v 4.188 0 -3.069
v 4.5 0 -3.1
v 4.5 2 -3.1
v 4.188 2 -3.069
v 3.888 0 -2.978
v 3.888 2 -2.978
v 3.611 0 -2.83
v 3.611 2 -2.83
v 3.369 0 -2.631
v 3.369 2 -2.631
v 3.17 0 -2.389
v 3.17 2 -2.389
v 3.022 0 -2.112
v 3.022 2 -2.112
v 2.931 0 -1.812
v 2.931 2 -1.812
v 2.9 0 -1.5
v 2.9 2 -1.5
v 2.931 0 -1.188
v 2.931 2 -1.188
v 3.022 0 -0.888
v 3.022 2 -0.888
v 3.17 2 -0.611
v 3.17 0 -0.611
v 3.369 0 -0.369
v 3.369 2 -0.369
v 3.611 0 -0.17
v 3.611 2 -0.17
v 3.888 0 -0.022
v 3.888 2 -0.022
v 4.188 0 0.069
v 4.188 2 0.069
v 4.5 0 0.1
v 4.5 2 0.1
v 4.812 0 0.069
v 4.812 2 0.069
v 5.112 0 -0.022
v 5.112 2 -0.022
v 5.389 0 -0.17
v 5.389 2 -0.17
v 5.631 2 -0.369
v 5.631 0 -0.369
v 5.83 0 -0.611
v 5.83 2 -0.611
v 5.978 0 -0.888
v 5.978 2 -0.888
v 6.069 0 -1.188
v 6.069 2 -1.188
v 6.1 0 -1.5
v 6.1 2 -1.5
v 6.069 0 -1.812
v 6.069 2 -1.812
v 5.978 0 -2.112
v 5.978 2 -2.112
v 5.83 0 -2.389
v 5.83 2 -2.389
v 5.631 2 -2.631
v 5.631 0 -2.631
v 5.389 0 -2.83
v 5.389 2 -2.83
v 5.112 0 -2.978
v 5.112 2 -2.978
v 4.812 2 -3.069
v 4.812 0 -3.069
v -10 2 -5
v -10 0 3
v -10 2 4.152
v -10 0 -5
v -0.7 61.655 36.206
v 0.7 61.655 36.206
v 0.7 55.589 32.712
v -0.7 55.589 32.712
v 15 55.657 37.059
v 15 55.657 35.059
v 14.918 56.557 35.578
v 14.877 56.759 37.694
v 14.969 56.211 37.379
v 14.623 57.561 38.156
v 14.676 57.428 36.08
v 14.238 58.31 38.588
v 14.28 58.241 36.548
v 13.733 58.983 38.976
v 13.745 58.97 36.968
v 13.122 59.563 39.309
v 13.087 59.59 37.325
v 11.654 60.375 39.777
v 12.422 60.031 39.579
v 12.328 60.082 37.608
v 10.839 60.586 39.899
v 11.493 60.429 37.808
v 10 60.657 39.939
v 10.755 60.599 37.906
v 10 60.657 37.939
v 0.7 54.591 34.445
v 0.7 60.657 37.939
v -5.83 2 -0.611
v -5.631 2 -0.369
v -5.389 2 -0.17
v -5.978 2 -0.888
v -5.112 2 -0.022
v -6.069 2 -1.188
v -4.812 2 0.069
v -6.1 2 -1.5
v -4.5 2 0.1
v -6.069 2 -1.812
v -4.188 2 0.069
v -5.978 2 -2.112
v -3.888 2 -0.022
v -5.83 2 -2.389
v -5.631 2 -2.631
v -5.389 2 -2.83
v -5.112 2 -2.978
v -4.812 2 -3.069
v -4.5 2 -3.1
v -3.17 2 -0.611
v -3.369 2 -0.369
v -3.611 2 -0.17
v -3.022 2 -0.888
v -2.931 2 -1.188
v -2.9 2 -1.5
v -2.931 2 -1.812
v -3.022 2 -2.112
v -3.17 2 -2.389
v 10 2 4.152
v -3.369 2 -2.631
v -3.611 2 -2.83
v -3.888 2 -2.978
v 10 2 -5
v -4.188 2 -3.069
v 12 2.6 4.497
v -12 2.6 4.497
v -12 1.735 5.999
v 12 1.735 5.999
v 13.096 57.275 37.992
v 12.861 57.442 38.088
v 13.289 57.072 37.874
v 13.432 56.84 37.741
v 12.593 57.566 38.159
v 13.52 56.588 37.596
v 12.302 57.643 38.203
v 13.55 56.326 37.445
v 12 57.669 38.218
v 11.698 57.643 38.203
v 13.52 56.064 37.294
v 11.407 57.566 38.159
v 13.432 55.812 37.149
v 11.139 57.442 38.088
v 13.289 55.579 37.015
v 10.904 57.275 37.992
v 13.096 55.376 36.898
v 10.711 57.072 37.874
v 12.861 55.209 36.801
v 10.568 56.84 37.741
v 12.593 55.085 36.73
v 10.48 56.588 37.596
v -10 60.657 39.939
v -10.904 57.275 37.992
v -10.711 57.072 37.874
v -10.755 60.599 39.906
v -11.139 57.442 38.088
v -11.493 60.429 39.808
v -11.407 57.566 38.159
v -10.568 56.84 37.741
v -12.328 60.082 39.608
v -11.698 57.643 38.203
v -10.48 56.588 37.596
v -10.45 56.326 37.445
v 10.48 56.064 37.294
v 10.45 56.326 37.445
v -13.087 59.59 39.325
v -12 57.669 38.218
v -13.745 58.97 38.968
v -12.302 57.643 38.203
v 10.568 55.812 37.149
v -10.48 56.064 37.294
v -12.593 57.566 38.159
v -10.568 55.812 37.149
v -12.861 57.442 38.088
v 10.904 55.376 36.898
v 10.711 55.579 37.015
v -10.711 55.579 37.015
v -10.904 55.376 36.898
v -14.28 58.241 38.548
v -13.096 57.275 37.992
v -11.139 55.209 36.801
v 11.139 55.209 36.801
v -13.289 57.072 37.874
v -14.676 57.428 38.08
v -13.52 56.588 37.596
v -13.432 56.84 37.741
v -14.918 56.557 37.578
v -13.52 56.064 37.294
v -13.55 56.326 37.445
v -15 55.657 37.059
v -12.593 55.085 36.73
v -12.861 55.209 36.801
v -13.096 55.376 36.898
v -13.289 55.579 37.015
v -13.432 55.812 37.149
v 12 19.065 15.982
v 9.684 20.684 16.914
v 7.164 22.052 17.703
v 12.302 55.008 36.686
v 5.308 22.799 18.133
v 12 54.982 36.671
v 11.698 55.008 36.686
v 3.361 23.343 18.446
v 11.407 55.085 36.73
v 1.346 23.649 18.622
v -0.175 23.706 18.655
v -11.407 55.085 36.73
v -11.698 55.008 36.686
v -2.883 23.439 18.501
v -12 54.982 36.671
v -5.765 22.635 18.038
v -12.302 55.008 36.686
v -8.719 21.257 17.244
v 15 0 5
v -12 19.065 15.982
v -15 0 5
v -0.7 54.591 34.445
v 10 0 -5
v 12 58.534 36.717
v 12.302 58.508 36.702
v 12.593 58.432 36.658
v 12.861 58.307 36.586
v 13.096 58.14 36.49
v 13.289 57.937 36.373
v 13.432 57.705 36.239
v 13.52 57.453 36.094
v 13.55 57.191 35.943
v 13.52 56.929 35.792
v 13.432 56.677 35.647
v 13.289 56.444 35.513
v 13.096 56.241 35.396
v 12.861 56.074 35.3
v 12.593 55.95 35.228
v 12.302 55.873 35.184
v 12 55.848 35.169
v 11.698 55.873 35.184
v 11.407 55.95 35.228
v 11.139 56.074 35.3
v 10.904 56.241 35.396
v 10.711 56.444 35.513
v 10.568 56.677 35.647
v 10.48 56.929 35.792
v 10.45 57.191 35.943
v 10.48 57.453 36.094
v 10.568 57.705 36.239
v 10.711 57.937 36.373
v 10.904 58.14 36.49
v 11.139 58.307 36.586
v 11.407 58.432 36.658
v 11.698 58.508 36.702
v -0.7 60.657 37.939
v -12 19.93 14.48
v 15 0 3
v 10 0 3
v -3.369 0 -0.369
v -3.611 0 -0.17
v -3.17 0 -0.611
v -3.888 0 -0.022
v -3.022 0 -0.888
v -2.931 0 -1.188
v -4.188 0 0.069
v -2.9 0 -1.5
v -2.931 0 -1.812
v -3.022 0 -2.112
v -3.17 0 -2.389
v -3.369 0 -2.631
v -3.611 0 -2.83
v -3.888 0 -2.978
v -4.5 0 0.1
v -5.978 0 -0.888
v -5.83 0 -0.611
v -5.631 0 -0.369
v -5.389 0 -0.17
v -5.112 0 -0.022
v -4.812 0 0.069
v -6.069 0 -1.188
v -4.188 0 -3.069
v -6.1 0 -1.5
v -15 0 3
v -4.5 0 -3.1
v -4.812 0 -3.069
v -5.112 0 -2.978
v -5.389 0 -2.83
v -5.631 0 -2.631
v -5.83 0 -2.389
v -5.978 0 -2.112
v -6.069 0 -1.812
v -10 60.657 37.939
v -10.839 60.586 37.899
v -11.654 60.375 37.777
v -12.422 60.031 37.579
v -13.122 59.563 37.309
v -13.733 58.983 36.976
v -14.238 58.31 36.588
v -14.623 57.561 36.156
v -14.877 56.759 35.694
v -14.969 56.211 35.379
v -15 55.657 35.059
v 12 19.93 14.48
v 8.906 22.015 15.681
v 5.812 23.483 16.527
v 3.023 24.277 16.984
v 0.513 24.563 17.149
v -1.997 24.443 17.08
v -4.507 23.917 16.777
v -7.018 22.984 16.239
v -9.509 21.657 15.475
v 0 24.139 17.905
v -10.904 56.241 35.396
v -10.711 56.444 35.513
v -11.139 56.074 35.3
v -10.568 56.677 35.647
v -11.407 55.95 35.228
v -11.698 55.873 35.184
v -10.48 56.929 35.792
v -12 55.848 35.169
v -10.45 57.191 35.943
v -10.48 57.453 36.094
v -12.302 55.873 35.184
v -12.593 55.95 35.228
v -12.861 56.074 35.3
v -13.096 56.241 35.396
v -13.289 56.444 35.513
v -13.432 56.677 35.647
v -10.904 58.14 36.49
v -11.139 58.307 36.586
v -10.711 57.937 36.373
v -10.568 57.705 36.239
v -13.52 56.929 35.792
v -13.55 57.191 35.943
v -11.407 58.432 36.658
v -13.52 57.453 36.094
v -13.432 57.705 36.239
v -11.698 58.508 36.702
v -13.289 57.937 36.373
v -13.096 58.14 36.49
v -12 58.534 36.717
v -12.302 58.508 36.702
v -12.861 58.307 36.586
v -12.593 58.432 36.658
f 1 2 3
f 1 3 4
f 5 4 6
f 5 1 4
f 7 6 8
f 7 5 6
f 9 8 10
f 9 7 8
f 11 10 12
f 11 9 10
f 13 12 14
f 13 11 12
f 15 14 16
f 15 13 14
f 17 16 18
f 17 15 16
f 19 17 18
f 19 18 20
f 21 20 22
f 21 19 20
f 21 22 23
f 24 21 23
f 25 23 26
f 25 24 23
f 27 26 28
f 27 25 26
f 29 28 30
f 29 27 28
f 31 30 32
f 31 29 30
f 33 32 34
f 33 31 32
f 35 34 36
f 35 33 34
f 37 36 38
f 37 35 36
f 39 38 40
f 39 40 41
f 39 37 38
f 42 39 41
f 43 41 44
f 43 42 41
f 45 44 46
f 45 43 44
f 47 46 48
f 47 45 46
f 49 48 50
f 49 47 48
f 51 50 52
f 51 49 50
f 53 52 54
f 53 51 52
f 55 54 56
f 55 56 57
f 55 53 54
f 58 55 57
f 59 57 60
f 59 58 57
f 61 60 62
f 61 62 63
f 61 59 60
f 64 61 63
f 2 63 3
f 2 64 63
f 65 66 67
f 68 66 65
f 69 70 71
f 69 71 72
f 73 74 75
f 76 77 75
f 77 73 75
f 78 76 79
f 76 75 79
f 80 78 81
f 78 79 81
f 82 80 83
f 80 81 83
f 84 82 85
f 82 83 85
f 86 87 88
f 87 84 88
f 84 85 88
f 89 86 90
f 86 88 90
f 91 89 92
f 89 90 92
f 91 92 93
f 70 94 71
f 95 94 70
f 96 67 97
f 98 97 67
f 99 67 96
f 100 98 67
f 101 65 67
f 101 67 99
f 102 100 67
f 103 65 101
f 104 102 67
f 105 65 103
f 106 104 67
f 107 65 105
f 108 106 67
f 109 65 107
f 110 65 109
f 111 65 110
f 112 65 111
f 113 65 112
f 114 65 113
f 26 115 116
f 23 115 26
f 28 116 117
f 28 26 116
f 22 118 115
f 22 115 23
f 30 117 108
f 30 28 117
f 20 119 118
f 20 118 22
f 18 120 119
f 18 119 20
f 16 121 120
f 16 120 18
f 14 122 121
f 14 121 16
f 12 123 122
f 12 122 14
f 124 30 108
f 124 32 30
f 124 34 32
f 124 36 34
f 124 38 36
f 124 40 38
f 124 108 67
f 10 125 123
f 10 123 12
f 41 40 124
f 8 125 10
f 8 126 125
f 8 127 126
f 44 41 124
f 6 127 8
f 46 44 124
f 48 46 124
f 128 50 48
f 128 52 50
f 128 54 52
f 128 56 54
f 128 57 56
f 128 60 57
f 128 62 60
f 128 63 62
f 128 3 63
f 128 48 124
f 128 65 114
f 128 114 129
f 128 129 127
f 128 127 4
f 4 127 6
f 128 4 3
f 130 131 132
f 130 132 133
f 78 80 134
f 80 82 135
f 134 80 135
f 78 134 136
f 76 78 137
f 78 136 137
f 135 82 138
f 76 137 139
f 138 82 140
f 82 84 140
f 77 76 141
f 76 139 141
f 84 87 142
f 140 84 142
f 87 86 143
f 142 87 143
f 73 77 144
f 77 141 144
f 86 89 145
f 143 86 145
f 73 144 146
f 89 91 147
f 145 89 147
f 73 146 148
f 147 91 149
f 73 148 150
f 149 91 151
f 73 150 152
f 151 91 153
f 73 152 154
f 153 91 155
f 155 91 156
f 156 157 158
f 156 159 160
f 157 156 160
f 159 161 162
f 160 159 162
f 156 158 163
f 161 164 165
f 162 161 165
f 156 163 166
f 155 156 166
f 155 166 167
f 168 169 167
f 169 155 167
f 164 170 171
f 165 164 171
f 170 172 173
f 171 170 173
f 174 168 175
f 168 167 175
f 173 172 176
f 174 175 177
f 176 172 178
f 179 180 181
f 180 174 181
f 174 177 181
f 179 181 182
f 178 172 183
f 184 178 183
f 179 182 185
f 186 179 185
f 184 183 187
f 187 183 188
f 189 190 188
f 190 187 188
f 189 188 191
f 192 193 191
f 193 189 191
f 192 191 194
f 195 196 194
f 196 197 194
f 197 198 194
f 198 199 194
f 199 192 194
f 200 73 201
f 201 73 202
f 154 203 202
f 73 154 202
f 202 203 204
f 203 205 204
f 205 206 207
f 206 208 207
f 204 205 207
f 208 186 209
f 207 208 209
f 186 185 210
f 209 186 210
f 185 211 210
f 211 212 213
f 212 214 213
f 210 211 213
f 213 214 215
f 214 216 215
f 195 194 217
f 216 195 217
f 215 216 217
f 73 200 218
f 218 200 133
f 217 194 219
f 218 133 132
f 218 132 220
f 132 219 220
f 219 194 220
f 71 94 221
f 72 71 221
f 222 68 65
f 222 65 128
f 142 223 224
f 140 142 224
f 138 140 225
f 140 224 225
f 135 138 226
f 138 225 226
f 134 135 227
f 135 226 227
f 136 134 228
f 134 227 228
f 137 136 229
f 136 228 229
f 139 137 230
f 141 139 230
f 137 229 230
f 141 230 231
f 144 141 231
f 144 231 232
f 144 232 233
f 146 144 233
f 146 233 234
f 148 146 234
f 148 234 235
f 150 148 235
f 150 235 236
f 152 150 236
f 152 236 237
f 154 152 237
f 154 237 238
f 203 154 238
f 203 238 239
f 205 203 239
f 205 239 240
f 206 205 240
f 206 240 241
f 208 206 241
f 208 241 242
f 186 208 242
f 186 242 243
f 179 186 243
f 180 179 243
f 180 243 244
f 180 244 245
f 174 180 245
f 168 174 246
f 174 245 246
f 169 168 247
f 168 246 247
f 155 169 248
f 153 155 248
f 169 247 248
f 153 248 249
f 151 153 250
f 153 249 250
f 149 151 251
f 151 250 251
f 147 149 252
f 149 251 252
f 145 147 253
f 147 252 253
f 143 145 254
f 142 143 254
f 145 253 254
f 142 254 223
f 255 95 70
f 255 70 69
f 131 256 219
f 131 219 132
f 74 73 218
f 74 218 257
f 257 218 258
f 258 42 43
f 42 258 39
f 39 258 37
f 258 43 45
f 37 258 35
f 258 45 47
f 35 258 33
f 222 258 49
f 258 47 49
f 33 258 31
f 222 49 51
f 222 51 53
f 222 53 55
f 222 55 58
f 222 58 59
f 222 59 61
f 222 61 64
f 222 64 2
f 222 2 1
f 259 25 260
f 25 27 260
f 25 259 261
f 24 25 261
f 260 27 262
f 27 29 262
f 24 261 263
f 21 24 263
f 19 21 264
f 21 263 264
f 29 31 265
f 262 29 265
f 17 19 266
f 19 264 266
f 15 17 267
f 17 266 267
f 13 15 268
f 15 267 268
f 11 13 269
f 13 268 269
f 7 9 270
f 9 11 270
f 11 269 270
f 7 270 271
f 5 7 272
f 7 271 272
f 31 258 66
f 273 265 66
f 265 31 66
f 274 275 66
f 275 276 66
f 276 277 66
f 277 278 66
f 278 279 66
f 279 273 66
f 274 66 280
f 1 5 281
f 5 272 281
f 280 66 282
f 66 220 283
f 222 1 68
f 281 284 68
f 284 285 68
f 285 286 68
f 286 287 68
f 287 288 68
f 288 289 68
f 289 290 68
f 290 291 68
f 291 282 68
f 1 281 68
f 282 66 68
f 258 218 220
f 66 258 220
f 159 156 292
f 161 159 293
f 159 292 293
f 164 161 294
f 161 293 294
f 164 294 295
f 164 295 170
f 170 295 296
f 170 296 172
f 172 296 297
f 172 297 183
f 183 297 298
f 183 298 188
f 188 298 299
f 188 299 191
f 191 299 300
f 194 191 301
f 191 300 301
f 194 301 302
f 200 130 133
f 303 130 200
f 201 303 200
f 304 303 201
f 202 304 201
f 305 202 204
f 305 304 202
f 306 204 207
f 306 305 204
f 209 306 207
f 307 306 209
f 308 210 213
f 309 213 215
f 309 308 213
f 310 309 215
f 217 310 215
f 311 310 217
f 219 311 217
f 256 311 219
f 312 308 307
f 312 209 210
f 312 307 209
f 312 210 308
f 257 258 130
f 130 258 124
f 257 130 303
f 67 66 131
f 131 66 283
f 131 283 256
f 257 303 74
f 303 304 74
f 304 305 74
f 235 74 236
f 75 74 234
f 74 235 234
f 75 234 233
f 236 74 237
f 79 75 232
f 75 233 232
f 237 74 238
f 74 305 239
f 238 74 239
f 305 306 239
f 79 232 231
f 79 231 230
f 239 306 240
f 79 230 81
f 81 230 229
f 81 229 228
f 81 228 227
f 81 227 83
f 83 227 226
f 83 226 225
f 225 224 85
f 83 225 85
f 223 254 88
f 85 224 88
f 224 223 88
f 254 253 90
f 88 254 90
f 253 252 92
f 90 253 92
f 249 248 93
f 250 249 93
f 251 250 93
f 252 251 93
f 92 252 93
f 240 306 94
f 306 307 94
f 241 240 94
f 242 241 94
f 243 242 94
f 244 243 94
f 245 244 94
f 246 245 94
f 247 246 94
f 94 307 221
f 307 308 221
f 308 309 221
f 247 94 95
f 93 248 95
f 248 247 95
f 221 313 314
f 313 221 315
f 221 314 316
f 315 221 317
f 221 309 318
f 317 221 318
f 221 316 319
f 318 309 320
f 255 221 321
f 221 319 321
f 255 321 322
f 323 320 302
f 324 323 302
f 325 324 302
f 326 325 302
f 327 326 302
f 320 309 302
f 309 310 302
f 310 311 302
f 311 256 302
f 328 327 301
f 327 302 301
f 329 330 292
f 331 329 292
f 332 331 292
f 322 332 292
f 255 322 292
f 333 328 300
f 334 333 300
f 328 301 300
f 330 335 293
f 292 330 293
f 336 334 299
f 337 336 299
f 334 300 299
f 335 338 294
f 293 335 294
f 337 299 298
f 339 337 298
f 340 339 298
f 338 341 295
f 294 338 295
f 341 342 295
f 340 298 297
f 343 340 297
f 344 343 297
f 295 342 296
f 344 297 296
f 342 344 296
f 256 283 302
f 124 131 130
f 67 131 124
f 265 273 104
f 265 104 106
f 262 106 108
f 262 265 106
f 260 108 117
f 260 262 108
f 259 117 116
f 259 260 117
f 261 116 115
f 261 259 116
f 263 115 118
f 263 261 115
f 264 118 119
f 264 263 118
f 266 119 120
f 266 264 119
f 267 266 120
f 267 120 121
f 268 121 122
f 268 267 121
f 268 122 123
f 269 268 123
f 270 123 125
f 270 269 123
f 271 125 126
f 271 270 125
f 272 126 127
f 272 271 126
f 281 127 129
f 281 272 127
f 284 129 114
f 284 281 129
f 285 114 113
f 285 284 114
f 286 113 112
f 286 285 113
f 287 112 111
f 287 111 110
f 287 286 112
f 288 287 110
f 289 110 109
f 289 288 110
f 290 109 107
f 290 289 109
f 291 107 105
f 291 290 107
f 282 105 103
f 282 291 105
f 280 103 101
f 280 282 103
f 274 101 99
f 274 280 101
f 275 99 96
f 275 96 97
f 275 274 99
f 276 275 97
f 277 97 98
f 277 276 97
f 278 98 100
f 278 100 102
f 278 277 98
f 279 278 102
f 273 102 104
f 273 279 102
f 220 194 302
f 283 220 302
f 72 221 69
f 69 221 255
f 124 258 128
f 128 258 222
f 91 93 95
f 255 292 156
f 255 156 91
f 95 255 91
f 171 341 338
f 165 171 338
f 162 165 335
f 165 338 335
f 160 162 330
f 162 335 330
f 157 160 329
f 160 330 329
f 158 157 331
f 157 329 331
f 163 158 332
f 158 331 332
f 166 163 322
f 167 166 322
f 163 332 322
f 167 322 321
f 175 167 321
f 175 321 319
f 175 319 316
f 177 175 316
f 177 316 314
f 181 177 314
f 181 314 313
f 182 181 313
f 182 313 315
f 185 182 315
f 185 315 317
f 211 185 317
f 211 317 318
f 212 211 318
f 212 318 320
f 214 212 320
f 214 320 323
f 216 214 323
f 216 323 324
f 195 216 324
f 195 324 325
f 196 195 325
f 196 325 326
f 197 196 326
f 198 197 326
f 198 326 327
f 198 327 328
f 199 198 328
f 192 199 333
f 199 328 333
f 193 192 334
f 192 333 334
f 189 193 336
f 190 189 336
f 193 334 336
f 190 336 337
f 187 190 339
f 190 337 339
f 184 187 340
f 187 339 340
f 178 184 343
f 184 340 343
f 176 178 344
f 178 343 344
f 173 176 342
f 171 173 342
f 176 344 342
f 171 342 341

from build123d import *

# Parameters (mm, degrees)
SKETCH_1_W           = 20
SKETCH_1_H           = 10
SKETCH_1_R           = 1.6
EXTRUDE_1_DEPTH      = 2
EXTRUDE_2_DEPTH      = 5
EXTRUDE_2_DEPTH_BACK = 25
FILLET_1_R           = 5
SKETCH_3_R           = 1.55
CUT_EXTRUDE_1_DEPTH  = 10
SKETCH_4_W           = 1.4
SKETCH_4_H           = 7
EXTRUDE_3_DEPTH      = 2


with BuildPart() as part:
    # 草图1 → 凸台-拉伸1 (new body)
    with BuildSketch(Plane(origin=(0, 0, 0), x_dir=(1, 0, 0), z_dir=(0, 1, 0))):
        Rectangle(SKETCH_1_W, SKETCH_1_H)
        with Locations(Location((-4.5, 1.5, 0), (0, 0, 270))):
            Circle(SKETCH_1_R, mode=Mode.SUBTRACT)
        with Locations(Location((4.5, 1.5, 0), (0, 0, 90))):
            Circle(SKETCH_1_R, mode=Mode.SUBTRACT)
    extrude(amount=EXTRUDE_1_DEPTH)

    # 草图2 → 凸台-拉伸2 (add, two sides: drawn at the far end of the back side and taken through both)
    with BuildSketch(Plane(origin=(10, 0, 0), x_dir=(0, 0, -1), z_dir=(1, 0, 0)).offset(-EXTRUDE_2_DEPTH_BACK)):
        Polygon((-5, 0), (-3, 0), (-37.93939209, 60.656729885), (-39.93939209, 60.656729885), align=None)
    extrude(amount=EXTRUDE_2_DEPTH + EXTRUDE_2_DEPTH_BACK)

    # 圆角1
    # the kernel refuses this fillet: 5 mm, written as the material it takes off along each edge
    with BuildSketch(Plane(origin=(-15, 60.656729885, 25.43939209), x_dir=(1, 0, 0), z_dir=(0, 0, 1)), Plane(origin=(15, 60.656729885, 25.43939209), x_dir=(0, -1, 0), z_dir=(0, 0, 1))) as fillet_1_piece_1:
        with BuildLine():
            CenterArc((FILLET_1_R, -FILLET_1_R), FILLET_1_R, 90, 90)
            Line((0, -FILLET_1_R), (0, 0))
            Line((0, 0), (FILLET_1_R, 0))
        make_face()
    extrude(amount=27, mode=Mode.SUBTRACT)

    # 草图3 → 切除-拉伸1 (cut)
    with BuildSketch(Plane(origin=(0, -1.297536287, 2.252595233), x_dir=(-1, 0, 0), z_dir=(0, 0.4991341727193529, -0.8665247126445773))):
        with Locations(Location((-12, 67.497402518, 0), (0, 0, 90))):
            Circle(SKETCH_3_R)
        with Locations(Location((12, 67.497402518, 0), (0, 0, 90))):
            Circle(SKETCH_3_R)
        with BuildLine():
            Line((12, 24.497402518), (12, 4.497402518))
            Line((12, 4.497402518), (-12, 4.497402518))
            Line((-12, 4.497402518), (-12, 24.497402518))
            add(Edge.make_bspline(
                [(-12, 24.497402518), (0, 35.211223002), (12, 24.497402518)],
                knots=[0, 0, 0, 1, 1, 1], degree=2))
        make_face()
    extrude(amount=-CUT_EXTRUDE_1_DEPTH, mode=Mode.SUBTRACT)

    # 草图4 → 凸台-拉伸3 (add)
    with BuildSketch(Plane(origin=(0, -1.297536287, 2.252595233), x_dir=(-1, 0, 0), z_dir=(0, 0.4991341727193529, -0.8665247126445773))):
        with Locations((0, 67.997402518)):
            Rectangle(SKETCH_4_W, SKETCH_4_H)
    extrude(amount=EXTRUDE_3_DEPTH)


solid = part.part
